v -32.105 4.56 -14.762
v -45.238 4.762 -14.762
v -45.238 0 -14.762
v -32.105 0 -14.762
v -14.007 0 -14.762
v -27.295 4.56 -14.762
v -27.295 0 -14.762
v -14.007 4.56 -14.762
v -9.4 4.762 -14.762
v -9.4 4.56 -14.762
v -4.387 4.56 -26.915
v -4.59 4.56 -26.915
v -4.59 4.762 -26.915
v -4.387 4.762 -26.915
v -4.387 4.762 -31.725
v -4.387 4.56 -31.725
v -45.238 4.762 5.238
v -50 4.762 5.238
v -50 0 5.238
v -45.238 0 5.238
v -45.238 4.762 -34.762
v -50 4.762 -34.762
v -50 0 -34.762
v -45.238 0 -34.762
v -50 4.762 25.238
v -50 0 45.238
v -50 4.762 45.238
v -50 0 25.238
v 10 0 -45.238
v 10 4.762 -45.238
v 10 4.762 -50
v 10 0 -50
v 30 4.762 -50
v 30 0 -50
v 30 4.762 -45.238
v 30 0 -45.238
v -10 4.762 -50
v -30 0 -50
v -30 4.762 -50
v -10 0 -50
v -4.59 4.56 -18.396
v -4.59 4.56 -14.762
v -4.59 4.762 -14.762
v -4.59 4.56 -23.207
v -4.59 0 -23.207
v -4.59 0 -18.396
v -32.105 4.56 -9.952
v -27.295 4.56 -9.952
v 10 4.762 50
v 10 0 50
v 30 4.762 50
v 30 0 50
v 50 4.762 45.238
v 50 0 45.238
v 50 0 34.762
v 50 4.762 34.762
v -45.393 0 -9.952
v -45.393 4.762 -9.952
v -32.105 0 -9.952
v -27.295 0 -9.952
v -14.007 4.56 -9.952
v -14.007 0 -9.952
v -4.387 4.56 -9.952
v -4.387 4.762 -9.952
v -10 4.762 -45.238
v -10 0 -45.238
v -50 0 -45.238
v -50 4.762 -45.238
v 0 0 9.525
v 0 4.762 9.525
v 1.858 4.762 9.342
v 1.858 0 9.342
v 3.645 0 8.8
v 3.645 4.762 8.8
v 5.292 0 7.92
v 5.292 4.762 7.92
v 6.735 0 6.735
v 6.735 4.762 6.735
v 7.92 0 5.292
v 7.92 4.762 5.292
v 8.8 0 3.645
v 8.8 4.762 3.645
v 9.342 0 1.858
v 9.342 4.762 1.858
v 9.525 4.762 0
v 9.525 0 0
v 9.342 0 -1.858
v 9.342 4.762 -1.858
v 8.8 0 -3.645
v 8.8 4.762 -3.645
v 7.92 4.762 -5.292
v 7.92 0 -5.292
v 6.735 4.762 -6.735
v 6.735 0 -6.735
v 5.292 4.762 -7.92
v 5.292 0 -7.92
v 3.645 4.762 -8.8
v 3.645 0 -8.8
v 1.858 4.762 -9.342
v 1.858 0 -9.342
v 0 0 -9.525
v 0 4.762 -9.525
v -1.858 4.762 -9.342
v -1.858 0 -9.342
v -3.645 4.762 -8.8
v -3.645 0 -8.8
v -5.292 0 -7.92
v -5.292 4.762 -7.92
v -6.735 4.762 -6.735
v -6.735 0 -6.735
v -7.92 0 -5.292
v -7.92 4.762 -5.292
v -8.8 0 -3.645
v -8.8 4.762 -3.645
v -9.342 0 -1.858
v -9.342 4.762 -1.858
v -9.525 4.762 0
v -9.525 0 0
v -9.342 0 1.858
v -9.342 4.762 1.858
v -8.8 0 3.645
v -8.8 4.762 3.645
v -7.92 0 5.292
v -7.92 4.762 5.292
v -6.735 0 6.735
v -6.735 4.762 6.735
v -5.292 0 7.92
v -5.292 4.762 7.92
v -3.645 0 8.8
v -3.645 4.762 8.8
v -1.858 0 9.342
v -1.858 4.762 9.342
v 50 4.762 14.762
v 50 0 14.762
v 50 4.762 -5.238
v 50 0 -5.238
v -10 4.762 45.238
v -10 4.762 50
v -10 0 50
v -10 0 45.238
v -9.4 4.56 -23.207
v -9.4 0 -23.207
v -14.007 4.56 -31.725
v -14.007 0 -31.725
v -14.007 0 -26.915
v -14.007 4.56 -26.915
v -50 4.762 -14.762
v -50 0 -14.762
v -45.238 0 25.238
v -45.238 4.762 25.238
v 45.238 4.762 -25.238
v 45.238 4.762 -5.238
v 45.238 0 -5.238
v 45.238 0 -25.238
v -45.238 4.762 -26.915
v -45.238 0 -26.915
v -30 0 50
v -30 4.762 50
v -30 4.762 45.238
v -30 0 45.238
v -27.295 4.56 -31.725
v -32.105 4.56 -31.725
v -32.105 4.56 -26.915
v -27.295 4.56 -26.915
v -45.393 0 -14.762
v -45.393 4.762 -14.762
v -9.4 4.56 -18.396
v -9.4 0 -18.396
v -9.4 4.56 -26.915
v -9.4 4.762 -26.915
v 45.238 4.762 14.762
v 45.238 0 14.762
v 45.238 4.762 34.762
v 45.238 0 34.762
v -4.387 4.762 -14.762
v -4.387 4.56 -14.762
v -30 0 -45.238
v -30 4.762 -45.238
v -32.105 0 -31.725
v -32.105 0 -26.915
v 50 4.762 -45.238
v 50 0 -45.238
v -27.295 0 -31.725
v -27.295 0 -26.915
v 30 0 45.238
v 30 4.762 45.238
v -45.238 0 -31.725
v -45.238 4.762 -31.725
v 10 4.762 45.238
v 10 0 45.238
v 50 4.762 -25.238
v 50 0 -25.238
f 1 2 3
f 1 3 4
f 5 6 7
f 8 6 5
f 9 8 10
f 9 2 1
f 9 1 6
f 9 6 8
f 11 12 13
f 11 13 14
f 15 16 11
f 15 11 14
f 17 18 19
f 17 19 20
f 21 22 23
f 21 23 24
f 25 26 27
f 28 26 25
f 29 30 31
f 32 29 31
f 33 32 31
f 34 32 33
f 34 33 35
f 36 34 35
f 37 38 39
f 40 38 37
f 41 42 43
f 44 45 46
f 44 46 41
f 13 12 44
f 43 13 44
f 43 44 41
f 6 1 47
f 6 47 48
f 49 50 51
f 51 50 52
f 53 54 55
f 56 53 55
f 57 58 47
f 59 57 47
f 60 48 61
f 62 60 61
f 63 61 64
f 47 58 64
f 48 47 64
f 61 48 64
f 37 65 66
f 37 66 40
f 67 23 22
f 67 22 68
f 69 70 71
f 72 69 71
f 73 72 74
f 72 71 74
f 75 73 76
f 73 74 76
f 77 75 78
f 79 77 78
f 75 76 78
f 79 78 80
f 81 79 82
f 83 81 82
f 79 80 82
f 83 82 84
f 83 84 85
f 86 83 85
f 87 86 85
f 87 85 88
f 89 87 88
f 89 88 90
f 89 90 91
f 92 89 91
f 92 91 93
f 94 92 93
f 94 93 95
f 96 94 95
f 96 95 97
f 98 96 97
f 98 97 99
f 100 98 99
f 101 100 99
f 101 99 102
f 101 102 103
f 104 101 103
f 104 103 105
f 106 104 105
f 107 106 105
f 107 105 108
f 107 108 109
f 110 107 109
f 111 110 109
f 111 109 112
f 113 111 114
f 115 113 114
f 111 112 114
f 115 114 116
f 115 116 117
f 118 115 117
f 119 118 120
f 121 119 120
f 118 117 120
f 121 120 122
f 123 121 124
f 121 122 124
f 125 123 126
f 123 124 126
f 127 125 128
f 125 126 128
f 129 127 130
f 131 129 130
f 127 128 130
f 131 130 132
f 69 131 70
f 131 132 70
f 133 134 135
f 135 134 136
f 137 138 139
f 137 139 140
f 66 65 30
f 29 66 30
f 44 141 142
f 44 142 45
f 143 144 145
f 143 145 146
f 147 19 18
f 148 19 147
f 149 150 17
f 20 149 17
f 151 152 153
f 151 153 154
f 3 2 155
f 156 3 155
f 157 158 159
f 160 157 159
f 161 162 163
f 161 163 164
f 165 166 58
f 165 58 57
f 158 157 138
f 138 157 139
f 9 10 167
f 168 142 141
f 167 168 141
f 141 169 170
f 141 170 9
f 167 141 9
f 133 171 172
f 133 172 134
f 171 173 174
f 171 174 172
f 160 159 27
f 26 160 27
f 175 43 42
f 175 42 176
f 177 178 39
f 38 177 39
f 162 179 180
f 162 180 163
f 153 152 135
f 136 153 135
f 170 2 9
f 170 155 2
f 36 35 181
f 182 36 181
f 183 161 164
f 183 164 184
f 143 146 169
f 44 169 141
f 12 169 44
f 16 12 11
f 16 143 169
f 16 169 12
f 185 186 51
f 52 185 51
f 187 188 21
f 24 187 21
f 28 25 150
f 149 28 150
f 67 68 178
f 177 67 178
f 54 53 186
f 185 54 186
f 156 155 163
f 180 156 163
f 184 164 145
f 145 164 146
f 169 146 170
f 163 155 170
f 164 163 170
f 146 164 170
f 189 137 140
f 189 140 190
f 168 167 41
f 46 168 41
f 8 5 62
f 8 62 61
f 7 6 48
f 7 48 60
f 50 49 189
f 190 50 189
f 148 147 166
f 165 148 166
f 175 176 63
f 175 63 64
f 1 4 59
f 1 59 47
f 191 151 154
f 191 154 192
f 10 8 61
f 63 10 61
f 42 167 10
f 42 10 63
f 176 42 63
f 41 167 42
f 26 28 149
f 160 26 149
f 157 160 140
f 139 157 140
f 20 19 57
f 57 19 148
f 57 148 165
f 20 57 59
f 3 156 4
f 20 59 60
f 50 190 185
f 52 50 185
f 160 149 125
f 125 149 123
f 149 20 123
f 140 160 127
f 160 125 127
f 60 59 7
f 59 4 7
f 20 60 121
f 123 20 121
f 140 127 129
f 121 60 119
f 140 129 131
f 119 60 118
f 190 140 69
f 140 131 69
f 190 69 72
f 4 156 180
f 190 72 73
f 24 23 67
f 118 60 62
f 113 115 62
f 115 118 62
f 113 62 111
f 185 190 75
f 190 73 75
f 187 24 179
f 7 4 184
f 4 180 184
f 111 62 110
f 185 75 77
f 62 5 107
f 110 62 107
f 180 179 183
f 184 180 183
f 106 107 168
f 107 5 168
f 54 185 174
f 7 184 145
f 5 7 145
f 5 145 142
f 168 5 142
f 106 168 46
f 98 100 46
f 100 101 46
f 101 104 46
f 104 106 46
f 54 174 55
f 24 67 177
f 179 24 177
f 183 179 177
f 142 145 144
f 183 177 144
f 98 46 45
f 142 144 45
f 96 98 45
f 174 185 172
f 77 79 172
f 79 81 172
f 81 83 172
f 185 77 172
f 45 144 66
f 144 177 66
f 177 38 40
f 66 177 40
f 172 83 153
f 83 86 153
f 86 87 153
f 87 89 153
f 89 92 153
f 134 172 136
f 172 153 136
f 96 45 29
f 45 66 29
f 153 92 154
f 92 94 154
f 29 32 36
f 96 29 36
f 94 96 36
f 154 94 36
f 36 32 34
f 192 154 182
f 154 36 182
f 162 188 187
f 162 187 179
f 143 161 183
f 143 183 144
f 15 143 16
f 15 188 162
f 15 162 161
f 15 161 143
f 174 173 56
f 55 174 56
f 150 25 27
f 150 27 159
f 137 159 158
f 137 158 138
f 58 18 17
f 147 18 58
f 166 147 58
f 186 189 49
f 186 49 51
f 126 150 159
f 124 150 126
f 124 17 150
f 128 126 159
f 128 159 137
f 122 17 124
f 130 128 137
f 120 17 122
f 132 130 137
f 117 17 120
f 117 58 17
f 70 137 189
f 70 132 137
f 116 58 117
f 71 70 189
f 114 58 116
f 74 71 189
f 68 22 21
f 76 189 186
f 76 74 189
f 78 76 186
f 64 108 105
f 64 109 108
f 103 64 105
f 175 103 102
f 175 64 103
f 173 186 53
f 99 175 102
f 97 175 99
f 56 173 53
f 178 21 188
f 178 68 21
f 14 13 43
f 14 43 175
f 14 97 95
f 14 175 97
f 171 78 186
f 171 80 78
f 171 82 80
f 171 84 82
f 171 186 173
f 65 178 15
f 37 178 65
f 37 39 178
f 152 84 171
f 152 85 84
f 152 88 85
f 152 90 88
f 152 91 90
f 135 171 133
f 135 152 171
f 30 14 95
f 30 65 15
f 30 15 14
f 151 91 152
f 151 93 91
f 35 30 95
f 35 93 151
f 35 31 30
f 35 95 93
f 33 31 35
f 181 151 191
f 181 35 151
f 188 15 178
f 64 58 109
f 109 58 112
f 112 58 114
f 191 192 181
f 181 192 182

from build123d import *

# Parameters (mm, degrees)
SKETCH1_W           = 100
SKETCH1_H           = 100
BOSS_EXTRUDE1_DEPTH = 4.7625
SKETCH2_W           = 20
SKETCH2_H           = 4.7625
SKETCH2_W_2         = 4.7625
SKETCH2_H_2         = 20
CUT_EXTRUDE1_DEPTH  = 4.7625
SKETCH3_R           = 9.525
CUT_EXTRUDE2_DEPTH  = 71.870878407
CAVITY2_START       = -14.7625
CAVITY2_DEPTH       = 4.810125
CAVITY2_START_2     = -31.725
CAVITY2_2_DEPTH     = 4.810125
CAVITY2_START_3     = -23.2065625
CAVITY2_3_OUTLINE_W = 4.810125
CAVITY2_3_OUTLINE_H = 4.7625
CAVITY2_3_DEPTH     = 4.810125
CAVITY2_START_4     = -26.914875
CAVITY2_4_OUTLINE_W = 4.810125
CAVITY2_4_OUTLINE_H = 0.203
CAVITY2_4_DEPTH     = 12.152375


# Read off the part's stored shape, not the designer's step: Cavity2
with BuildPart() as part:
    # Sketch1 → Boss-Extrude1 (new body)
    with BuildSketch(Plane(origin=(0, 0, 0), x_dir=(1, 0, 0), z_dir=(0, 1, 0))):
        Rectangle(SKETCH1_W, SKETCH1_H)
    extrude(amount=BOSS_EXTRUDE1_DEPTH)

    # Sketch2 → Cut-Extrude1 (cut)
    with BuildSketch(Plane(origin=(0, 4.7625, 0), x_dir=(1, 0, 0), z_dir=(0, 1, 0))):
        Polygon((-50, 45.2375), (-45.2375, 45.2375), (-30, 45.2375), (-30, 50), (-50, 50), align=None)
        with Locations((0, 47.61875)):
            Rectangle(SKETCH2_W, SKETCH2_H)
        Polygon((30, 50), (30, 45.2375), (45.2375, 45.2375), (50, 45.2375), (50, 50), align=None)
        with Locations((47.61875, 15.2375)):
            Rectangle(SKETCH2_W_2, SKETCH2_H_2)
        with Locations((47.61875, -24.7625)):
            Rectangle(SKETCH2_W_2, SKETCH2_H_2)
        Polygon((45.2375, -45.2375), (30, -45.2375), (30, -50), (50, -50), (50, -45.2375), align=None)
        with Locations((0, -47.61875)):
            Rectangle(SKETCH2_W, SKETCH2_H)
        Polygon((-30, -45.2375), (-45.2375, -45.2375), (-50, -45.2375), (-50, -50), (-30, -50), align=None)
        with Locations((-47.61875, -15.2375)):
            Rectangle(SKETCH2_W_2, SKETCH2_H_2)
        with Locations((-47.61875, 24.7625)):
            Rectangle(SKETCH2_W_2, SKETCH2_H_2)
    extrude(amount=-CUT_EXTRUDE1_DEPTH, mode=Mode.SUBTRACT)

    # Sketch3 → Cut-Extrude2 (cut, through all)
    with BuildSketch(Plane(origin=(0, 4.7625, 0), x_dir=(1, 0, 0), z_dir=(0, 1, 0))):
        with Locations(Location((0, 0, 0), (0, 0, 270))):
            Circle(SKETCH3_R)
    extrude(amount=-CUT_EXTRUDE2_DEPTH, mode=Mode.SUBTRACT)

    # Cavity2 outline → Cavity2 (cut)
    with BuildSketch(Plane.XY.offset(CAVITY2_START)):
        Polygon((-4.386875, 4.5595), (-4.386875, 4.7625), (-45.392875, 4.7625), (-45.392875, 0), (-32.1050625, 0), (-32.1050625, 4.5595), (-27.2949375, 4.5595), (-27.2949375, 0), (-14.007125, 0), (-14.007125, 4.5595), align=None)
    extrude(amount=CAVITY2_DEPTH, mode=Mode.SUBTRACT)

    # Cavity2 2 outline → Cavity2 2 (cut)
    with BuildSketch(Plane.XY.offset(CAVITY2_START_2)):
        Polygon((-4.386875, 4.5595), (-4.386875, 4.7625), (-45.2375, 4.7625), (-45.2375, 0), (-32.1050625, 0), (-32.1050625, 4.5595), (-27.2949375, 4.5595), (-27.2949375, 0), (-14.007125, 0), (-14.007125, 4.5595), align=None)
    extrude(amount=CAVITY2_2_DEPTH, mode=Mode.SUBTRACT)

    # Cavity2 3 outline → Cavity2 3 (cut)
    with BuildSketch(Plane.XY.offset(CAVITY2_START_3)):
        with Locations((-6.9949375, 2.38125)):
            Rectangle(CAVITY2_3_OUTLINE_W, CAVITY2_3_OUTLINE_H)
    extrude(amount=CAVITY2_3_DEPTH, mode=Mode.SUBTRACT)

    # Cavity2 4 outline → Cavity2 4 (cut)
    with BuildSketch(Plane.XY.offset(CAVITY2_START_4)):
        with Locations((-6.9949375, 4.661)):
            Rectangle(CAVITY2_4_OUTLINE_W, CAVITY2_4_OUTLINE_H)
    extrude(amount=CAVITY2_4_DEPTH, mode=Mode.SUBTRACT)


solid = part.part
